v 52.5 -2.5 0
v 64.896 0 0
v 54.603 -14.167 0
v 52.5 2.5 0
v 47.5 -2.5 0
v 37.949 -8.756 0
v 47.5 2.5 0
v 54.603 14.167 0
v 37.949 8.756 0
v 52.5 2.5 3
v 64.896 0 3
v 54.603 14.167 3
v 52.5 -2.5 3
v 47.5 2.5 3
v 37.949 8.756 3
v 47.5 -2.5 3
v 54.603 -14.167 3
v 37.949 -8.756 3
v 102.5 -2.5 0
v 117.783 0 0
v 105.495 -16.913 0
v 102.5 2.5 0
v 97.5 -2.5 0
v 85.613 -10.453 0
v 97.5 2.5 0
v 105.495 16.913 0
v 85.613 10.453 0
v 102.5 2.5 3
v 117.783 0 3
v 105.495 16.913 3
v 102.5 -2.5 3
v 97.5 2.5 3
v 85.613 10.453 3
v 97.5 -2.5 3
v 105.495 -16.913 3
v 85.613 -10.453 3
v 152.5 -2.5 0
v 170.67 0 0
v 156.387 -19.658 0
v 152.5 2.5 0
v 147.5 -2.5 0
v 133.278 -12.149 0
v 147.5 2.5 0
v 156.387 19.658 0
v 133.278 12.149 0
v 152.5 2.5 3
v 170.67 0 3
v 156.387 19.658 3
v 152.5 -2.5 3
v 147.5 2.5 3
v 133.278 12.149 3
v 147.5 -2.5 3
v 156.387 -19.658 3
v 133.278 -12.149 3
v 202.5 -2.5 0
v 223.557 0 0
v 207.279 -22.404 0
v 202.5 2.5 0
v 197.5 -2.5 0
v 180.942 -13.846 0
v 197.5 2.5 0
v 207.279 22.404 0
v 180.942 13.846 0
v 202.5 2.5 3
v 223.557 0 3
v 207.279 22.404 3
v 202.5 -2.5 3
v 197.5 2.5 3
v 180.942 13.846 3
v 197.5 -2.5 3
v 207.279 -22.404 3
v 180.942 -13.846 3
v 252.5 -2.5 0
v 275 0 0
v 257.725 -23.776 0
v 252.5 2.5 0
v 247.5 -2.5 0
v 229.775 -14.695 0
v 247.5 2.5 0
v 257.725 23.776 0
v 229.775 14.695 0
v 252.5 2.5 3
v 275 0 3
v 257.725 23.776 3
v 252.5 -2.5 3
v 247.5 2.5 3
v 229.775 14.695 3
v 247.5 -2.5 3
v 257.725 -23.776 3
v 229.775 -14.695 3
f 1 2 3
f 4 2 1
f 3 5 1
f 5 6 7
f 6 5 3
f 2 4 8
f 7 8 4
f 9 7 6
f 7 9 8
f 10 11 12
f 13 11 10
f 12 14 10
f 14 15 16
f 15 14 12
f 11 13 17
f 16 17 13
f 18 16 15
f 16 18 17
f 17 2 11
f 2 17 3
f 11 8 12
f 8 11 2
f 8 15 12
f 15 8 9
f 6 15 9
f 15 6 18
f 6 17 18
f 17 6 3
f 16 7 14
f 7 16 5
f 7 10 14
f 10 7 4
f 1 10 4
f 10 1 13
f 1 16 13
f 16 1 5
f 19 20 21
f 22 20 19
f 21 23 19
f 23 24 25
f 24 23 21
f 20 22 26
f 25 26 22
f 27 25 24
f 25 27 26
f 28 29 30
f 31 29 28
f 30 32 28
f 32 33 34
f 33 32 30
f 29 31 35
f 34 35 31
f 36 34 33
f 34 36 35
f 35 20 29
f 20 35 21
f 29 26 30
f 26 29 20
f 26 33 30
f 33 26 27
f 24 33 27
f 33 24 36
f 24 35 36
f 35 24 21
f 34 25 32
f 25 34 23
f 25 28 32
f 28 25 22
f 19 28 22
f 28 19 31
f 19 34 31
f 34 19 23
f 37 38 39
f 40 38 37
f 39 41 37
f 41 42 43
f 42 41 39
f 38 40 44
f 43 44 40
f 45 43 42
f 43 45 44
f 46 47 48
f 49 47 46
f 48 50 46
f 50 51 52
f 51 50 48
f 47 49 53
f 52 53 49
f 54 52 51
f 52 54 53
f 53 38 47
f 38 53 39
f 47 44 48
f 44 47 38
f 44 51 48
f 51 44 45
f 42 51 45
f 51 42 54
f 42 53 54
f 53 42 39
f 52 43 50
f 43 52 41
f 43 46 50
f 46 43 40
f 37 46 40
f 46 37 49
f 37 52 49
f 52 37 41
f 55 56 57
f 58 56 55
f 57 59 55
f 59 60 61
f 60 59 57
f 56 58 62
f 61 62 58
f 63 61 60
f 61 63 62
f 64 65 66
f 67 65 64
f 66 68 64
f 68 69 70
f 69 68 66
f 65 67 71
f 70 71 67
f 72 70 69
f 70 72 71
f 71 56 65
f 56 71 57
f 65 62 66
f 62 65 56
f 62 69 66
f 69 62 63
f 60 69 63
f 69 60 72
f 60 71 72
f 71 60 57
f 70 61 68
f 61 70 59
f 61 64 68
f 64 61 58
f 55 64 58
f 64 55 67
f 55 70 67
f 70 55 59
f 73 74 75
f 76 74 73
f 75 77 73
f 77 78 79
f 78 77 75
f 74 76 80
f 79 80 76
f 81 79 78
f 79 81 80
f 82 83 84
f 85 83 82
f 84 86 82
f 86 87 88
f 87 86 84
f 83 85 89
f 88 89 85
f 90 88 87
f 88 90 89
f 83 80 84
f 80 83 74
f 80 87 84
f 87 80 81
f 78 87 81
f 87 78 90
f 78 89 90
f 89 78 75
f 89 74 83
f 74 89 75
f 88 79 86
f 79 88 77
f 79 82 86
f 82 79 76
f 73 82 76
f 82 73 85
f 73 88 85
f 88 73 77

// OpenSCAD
// file: head.scad
include <config.scad>;

module head()
{
    difference()
    {
        scale([
            diameter/2,
            diameter/2,
            height/2
            ])
        sphere();
        
        cube([
            cutout_x,
            cutout_y,
            height
            ], center=true);
    }
}

head();
// file: config.scad
height = 30;
diameter = 50;
cutout_x = 5;
cutout_y = 5;
material_z = 3;

//$fn=500;
// main file
include <config.scad>;
use <head.scad>;


for (i = [0:5])
{
    translate([i*diameter, 0, 0])
    linear_extrude(material_z)
    projection()
    intersection()
    {
        // model
        translate([0, 0, -height/2 + i*material_z])
        head();
        
        // plane
        cube([
            diameter,
            diameter,
            material_z
            ], center=true);
    }
}
